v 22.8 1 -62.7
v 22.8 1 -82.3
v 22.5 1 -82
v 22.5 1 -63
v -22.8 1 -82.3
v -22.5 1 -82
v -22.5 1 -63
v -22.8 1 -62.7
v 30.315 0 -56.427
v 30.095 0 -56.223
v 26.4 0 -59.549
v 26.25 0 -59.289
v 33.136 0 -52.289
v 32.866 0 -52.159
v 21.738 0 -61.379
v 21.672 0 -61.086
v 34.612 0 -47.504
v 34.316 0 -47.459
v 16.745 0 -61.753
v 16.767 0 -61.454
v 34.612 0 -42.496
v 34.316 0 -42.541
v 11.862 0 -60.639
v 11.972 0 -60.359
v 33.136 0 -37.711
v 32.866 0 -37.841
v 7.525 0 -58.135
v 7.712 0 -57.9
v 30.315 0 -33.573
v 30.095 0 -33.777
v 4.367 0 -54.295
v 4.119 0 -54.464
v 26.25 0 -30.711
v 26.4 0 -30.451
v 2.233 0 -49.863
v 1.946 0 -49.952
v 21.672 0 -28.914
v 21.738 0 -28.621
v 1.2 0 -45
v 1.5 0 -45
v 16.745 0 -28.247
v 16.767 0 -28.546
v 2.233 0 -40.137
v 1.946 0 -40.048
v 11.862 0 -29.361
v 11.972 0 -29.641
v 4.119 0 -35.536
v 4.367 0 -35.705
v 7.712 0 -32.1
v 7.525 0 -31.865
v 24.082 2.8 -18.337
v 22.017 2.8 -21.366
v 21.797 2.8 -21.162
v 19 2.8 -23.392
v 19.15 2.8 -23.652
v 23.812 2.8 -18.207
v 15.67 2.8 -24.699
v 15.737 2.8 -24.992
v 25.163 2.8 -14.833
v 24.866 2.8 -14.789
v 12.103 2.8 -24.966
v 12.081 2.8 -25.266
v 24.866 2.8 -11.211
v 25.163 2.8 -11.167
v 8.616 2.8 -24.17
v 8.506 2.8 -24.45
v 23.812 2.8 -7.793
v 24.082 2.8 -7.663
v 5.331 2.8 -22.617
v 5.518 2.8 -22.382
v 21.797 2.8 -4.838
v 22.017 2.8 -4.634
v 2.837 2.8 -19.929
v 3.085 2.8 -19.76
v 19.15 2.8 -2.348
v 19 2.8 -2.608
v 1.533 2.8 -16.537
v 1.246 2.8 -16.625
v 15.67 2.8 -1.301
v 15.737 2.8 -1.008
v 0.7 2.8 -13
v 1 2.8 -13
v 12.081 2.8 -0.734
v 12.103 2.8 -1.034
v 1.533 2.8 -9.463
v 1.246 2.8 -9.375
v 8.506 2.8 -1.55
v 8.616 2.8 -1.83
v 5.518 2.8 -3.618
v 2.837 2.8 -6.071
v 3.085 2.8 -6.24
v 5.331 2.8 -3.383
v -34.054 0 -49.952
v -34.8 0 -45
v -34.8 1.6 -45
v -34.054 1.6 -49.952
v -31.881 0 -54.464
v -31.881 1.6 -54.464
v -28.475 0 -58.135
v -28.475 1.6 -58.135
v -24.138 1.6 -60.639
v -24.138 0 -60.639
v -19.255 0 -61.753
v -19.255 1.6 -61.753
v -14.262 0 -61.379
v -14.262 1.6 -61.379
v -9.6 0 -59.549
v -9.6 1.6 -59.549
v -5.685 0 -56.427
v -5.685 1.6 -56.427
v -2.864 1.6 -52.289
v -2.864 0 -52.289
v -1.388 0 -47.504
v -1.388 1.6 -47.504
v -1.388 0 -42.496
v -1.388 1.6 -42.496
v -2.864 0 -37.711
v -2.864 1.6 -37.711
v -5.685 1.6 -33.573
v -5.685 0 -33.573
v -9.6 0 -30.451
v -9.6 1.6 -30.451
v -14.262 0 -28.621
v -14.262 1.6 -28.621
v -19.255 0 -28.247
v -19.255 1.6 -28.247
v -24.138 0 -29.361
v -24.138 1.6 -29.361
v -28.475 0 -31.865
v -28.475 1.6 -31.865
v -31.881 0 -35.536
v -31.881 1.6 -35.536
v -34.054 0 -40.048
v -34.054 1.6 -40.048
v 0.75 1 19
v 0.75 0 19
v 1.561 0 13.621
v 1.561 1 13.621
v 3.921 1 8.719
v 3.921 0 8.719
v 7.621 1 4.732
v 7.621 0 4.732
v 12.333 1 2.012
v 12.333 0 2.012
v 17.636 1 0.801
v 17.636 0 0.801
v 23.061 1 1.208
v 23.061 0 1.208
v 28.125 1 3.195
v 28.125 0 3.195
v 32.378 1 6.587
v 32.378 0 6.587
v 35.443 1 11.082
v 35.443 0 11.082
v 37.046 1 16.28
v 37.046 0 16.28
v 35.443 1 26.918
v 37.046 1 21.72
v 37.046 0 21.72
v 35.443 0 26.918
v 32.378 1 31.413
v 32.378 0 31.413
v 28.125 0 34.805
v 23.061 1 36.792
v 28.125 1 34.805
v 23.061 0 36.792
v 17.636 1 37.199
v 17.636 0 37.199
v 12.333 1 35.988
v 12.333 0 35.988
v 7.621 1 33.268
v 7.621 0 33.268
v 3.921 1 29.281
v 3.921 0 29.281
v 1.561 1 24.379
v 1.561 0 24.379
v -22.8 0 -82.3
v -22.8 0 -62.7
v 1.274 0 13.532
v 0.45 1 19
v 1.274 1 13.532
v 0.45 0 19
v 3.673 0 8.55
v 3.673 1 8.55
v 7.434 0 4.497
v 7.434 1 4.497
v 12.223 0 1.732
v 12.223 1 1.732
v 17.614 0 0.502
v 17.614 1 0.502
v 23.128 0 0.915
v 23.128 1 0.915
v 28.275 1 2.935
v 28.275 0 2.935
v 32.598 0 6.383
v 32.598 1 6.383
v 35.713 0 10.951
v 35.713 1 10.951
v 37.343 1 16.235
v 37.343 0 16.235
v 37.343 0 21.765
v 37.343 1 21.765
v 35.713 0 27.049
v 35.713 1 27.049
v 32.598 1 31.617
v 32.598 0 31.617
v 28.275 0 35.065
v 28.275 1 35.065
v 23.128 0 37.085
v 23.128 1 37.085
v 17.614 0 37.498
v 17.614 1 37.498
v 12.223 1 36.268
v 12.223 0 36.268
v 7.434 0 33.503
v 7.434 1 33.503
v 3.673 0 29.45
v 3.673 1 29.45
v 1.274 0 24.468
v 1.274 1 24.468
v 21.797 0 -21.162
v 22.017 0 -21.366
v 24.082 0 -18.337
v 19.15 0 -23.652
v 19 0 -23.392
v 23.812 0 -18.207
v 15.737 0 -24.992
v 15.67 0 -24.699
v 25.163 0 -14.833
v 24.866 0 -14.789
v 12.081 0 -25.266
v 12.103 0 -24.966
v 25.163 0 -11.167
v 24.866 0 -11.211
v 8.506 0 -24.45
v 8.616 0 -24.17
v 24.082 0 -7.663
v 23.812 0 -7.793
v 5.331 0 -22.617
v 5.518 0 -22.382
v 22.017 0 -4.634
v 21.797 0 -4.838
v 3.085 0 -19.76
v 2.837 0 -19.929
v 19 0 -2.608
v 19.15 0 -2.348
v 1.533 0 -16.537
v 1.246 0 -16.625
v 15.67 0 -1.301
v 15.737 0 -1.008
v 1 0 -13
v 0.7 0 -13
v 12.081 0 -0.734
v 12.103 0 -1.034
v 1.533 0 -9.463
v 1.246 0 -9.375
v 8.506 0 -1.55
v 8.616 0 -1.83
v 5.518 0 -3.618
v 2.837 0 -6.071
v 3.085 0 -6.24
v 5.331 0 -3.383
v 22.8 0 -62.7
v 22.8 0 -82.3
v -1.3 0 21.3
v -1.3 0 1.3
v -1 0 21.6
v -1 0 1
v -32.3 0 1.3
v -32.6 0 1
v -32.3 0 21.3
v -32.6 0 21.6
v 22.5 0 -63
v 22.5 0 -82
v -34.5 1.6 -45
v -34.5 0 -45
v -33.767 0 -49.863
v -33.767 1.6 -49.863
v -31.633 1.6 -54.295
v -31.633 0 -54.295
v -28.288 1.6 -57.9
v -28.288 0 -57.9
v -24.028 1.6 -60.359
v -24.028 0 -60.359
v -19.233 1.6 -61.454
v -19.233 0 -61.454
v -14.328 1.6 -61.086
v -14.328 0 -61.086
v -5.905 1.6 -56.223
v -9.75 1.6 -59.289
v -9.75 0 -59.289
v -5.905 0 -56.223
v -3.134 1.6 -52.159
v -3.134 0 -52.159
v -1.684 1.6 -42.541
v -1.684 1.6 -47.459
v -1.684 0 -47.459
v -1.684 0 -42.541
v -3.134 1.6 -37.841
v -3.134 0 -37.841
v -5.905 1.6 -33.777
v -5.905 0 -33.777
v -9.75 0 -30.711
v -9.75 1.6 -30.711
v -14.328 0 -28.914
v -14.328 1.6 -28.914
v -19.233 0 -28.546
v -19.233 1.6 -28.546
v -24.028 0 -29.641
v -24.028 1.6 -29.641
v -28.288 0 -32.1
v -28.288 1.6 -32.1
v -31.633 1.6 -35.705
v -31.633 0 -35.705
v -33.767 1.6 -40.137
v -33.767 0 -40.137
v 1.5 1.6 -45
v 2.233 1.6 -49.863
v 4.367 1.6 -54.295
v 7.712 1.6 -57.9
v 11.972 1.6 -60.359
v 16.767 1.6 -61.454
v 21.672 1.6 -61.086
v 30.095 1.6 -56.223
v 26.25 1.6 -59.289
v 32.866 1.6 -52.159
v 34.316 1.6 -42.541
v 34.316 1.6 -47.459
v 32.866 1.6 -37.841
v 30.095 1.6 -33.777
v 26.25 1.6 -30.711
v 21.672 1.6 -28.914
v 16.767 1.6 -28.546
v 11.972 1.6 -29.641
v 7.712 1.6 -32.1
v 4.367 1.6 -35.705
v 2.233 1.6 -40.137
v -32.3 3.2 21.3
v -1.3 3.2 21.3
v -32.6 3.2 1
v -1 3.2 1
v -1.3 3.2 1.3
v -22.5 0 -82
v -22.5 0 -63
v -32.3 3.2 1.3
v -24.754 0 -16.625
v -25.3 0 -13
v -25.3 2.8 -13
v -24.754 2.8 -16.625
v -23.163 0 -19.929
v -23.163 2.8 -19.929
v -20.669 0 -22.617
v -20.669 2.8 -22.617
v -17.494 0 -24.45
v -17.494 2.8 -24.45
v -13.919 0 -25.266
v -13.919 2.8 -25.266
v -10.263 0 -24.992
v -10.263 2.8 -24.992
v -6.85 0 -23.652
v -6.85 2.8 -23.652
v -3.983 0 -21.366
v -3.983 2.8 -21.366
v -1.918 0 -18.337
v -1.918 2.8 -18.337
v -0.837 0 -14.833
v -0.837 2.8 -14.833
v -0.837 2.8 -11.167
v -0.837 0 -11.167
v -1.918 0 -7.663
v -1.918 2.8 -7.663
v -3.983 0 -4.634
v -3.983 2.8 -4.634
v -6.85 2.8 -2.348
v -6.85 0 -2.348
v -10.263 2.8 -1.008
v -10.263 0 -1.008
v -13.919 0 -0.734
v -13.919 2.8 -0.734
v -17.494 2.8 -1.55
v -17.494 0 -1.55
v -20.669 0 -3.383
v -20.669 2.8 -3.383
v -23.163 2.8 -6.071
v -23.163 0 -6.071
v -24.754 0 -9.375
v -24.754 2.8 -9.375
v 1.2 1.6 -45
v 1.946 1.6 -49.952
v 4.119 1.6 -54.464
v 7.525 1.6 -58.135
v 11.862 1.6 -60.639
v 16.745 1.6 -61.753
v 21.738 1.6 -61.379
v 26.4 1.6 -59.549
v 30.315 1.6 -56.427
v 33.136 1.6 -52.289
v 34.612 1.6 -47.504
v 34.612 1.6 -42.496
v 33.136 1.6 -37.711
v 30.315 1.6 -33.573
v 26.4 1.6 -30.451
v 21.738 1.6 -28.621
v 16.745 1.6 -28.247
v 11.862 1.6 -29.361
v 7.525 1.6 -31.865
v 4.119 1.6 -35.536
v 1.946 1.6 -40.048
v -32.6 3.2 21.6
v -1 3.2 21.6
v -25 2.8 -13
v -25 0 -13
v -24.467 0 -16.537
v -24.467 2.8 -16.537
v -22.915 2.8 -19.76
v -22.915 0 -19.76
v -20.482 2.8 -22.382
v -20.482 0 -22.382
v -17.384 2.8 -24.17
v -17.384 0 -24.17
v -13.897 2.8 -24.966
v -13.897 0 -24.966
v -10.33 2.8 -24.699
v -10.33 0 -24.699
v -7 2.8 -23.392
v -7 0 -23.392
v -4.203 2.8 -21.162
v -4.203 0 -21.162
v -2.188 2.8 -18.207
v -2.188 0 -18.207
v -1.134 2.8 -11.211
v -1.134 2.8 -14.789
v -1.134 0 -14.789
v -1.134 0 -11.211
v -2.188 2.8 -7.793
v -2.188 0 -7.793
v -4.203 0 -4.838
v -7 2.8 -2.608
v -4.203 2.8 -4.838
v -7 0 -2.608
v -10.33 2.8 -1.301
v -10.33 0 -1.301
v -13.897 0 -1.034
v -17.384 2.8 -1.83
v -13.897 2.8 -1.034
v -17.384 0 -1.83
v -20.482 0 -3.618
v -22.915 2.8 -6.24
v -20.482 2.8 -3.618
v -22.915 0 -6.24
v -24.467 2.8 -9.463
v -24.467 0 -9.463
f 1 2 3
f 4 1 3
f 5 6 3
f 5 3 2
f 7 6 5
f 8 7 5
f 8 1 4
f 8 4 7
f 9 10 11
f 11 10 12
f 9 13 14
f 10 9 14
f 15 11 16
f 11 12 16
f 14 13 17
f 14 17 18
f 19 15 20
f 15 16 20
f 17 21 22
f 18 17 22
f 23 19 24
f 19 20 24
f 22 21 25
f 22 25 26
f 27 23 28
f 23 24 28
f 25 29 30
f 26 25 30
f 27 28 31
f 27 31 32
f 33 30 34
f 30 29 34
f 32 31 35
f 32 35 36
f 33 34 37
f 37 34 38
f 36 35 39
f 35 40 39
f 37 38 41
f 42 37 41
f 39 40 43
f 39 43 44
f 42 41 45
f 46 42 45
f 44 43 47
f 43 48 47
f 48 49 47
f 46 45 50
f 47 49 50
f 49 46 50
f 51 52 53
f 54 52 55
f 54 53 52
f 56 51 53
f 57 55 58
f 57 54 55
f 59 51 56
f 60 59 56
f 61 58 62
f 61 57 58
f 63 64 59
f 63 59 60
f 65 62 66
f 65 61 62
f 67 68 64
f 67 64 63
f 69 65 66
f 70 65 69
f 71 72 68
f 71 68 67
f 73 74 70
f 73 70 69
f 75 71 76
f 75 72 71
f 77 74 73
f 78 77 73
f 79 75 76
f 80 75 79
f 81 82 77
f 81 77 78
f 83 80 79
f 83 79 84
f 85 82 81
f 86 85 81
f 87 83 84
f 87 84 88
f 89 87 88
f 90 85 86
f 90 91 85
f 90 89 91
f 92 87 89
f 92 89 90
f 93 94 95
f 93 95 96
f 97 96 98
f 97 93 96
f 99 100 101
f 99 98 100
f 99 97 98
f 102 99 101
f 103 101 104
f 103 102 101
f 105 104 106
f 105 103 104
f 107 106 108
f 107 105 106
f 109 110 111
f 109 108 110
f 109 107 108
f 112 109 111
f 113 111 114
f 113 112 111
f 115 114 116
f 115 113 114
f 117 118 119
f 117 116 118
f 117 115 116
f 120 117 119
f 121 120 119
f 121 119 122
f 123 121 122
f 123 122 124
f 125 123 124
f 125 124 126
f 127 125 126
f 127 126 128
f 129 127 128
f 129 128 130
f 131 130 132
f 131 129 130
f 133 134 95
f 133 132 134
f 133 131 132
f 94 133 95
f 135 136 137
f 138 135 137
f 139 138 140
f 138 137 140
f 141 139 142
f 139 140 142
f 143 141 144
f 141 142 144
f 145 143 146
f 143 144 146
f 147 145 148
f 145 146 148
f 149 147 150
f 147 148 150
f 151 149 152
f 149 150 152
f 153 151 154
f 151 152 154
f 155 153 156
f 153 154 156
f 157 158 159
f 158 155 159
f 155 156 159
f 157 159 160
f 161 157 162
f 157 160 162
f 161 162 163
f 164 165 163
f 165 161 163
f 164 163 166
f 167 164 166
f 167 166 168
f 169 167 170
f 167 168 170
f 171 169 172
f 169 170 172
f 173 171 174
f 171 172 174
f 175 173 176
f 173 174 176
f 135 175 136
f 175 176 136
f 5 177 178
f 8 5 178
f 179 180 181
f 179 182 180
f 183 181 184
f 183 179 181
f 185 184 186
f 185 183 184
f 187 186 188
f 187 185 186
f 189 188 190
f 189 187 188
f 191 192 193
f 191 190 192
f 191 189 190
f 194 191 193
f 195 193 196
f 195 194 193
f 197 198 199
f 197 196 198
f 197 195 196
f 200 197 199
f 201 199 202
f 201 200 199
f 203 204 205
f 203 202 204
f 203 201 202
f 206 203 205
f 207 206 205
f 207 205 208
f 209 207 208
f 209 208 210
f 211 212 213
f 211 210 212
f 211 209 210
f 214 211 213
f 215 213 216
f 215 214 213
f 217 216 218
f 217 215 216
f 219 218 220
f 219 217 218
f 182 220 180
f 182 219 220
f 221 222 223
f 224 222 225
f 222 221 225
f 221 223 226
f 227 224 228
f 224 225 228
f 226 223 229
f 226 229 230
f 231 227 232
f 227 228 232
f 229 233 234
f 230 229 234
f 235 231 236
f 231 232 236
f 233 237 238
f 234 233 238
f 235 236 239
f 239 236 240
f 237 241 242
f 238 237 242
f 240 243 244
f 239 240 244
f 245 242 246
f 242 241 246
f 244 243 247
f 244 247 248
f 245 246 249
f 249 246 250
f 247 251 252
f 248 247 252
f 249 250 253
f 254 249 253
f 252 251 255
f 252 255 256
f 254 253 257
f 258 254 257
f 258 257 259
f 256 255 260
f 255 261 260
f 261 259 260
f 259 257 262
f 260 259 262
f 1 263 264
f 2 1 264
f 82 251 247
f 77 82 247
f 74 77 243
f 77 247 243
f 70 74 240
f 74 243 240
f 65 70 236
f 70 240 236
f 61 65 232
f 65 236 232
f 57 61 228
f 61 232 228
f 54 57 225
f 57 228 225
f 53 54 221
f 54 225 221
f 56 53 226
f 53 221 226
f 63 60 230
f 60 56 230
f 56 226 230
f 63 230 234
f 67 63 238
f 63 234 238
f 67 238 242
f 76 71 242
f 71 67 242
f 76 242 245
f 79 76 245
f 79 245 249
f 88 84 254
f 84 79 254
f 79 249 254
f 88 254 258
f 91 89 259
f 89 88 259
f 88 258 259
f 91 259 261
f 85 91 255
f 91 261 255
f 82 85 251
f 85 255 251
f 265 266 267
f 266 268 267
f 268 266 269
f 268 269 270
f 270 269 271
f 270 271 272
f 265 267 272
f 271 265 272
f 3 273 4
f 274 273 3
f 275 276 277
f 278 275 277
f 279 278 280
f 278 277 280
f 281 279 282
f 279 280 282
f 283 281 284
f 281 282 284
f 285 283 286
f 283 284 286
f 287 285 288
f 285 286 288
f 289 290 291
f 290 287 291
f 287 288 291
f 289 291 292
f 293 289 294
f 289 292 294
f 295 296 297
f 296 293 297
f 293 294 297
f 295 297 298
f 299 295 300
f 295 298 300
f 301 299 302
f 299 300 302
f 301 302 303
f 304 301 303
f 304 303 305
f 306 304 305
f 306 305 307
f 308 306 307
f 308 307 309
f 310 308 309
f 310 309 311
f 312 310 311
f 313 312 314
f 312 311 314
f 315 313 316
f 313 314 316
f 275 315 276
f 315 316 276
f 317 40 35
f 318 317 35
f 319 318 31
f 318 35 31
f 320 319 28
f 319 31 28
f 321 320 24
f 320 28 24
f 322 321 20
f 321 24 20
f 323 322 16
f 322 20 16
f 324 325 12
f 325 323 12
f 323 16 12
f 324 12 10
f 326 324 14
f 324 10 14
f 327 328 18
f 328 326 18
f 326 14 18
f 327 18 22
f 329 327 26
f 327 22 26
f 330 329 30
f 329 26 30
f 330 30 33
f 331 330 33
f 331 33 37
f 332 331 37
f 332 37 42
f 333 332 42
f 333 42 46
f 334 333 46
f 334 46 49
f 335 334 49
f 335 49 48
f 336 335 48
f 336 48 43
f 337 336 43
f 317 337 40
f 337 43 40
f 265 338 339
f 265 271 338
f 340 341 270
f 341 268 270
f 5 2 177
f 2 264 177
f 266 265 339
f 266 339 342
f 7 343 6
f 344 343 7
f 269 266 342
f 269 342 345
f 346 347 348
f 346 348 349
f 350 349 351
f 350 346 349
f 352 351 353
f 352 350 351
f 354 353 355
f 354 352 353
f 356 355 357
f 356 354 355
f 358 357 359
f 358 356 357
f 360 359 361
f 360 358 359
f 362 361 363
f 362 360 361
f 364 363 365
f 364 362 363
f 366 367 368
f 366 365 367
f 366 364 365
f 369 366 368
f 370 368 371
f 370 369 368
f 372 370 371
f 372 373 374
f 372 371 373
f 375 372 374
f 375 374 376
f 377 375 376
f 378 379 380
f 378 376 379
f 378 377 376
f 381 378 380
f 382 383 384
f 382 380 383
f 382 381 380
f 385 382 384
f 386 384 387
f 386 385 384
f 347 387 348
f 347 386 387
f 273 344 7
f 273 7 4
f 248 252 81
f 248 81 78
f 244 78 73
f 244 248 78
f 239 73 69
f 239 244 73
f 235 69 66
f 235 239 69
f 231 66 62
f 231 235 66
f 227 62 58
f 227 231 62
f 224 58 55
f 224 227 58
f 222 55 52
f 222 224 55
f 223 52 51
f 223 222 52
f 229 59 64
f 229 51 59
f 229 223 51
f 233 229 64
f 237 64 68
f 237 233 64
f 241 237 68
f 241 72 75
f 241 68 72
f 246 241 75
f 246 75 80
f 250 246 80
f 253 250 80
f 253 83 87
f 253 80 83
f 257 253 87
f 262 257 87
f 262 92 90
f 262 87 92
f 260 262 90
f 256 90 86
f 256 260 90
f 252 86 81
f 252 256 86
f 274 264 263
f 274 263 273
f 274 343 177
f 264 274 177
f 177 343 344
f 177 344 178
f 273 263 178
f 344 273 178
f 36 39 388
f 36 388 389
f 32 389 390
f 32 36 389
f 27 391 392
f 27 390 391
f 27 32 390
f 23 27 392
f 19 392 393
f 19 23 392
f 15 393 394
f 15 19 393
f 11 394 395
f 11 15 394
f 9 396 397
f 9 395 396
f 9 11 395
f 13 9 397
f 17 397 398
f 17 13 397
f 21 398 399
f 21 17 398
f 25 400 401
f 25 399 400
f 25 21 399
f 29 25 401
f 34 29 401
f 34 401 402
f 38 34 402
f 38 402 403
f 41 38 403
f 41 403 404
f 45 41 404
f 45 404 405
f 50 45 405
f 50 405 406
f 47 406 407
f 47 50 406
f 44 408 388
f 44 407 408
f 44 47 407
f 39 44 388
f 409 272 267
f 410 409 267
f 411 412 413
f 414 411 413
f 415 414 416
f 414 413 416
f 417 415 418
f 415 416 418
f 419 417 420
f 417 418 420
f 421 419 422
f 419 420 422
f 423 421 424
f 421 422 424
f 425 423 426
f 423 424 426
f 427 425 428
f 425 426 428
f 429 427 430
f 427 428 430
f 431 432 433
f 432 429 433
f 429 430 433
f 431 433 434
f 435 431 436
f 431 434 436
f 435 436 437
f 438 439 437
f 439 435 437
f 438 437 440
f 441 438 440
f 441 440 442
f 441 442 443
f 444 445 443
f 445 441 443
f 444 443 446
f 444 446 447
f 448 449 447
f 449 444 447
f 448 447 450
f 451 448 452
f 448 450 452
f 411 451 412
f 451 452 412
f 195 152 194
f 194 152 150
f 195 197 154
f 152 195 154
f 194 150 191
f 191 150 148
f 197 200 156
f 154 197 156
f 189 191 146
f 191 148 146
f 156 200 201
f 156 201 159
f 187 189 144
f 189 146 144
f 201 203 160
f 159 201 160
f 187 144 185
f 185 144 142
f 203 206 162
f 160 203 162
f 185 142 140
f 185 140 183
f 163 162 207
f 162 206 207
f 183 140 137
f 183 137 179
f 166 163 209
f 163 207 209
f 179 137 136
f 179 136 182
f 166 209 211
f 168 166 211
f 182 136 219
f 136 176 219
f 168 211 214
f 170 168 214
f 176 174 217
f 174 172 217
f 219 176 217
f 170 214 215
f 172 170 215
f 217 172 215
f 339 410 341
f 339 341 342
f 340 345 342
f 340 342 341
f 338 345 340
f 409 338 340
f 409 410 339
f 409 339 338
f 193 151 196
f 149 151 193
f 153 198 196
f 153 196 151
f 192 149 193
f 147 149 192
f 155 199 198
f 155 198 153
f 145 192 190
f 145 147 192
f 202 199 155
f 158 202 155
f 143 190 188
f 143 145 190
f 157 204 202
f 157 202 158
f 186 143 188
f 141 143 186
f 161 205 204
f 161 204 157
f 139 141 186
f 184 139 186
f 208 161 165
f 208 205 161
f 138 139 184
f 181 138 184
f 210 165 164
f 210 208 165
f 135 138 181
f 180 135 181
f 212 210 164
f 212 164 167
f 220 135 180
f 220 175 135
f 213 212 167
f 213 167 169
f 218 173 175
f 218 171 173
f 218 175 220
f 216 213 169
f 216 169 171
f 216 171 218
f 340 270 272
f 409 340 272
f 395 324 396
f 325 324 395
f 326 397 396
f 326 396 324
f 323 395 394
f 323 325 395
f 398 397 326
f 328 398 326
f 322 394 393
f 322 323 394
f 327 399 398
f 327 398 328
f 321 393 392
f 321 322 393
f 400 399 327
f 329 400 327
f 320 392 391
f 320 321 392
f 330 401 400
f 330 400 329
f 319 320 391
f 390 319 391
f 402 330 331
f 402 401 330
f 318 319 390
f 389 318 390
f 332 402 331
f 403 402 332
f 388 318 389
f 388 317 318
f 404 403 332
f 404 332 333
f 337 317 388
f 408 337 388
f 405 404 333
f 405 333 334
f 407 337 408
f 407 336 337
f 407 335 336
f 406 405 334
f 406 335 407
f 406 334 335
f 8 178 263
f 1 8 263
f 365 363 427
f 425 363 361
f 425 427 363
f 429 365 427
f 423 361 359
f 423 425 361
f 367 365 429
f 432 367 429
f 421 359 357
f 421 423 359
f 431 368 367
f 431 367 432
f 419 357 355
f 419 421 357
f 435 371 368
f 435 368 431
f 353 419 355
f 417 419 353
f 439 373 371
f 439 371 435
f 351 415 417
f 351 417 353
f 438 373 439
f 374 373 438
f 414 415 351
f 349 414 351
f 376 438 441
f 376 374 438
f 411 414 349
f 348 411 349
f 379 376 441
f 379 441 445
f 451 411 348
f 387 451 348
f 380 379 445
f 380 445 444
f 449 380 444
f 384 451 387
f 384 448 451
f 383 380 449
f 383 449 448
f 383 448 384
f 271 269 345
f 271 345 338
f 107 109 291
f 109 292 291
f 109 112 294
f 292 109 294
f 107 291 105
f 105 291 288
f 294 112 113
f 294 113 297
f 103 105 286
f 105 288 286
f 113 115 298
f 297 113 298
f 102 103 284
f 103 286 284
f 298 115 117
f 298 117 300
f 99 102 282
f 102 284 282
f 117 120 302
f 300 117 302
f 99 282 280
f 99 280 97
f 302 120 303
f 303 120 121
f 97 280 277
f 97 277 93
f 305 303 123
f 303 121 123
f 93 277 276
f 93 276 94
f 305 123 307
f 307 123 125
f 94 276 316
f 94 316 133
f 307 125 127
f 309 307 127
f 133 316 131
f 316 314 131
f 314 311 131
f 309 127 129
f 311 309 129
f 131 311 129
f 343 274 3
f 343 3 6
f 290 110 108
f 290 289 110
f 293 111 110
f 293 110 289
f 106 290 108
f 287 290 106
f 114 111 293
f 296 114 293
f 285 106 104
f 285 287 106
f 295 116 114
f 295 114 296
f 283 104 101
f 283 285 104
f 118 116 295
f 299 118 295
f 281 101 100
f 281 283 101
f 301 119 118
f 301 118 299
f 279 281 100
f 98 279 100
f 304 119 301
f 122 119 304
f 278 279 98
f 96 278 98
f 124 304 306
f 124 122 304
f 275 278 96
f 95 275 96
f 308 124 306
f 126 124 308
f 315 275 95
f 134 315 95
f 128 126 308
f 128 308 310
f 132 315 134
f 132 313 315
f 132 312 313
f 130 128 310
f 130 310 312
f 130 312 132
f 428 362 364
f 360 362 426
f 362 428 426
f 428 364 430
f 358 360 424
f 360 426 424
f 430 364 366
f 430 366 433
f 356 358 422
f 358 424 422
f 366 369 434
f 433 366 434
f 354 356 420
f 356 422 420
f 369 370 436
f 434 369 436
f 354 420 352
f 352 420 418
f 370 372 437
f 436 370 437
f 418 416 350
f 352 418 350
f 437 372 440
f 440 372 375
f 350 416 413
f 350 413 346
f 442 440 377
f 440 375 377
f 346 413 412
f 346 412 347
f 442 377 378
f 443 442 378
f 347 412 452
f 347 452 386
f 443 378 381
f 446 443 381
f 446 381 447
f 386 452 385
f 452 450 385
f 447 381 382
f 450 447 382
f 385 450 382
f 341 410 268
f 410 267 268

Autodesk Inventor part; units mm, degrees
ref_plane "YZ Plane" through (0, 0, 0) normal (1, 0, 0) x (0, 1, 0)
ref_plane "XZ Plane" through (0, 0, 0) normal (0, 1, 0) x (-1, 0, 0)
ref_plane "XY Plane" through (0, 0, 0) normal (0, 0, 1) x (1, 0, 0)
sketch "スケッチ1" plane through (0, 0, 0) normal (0, 1, 0) x (-1, 0, 0)
  line L0 (0, -106.27) -> (0, 61.52) projected
  line L1 (-52.02, 0) -> (49.27, 0) projected
  circle A0 centre (13, -13) radius 12
  circle A1 centre (13, -13) radius 12.3
  circle A2 centre (18, -45) radius 16.5
  circle A3 centre (18, -45) radius 16.8
  circle A4 centre (-13, -13) radius 12
  circle A5 centre (-13, -13) radius 12.3
  circle A6 centre (-18, -45) radius 16.5
  circle A7 centre (-18, -45) radius 16.8
  line L2 (32.6, 21.6) -> (1, 21.6)
  line L3 (1, 21.6) -> (1, 1)
  line L4 (1, 1) -> (32.6, 1)
  line L5 (32.6, 1) -> (32.6, 21.6)
  line L6 (32.3, 21.3) -> (1.3, 21.3)
  line L7 (1.3, 21.3) -> (1.3, 1.3)
  line L8 (1.3, 1.3) -> (32.3, 1.3)
  line L9 (32.3, 1.3) -> (32.3, 21.3)
  circle A8 centre (-19, 19) radius 18.55
  circle A9 centre (-19, 19) radius 18.25
  line L10 (22.8, -62.7) -> (-22.8, -62.7)
  line L11 (-22.8, -62.7) -> (-22.8, -82.3)
  line L12 (-22.8, -82.3) -> (22.8, -82.3)
  line L13 (22.8, -82.3) -> (22.8, -62.7)
  line L14 (22.5, -63) -> (-22.5, -63)
  line L15 (-22.5, -63) -> (-22.5, -82)
  line L16 (-22.5, -82) -> (22.5, -82)
  line L17 (22.5, -82) -> (22.5, -63)
  point P0 (0, 0)
  point P1 (0, -82.3)
  point P2 (0, -82)
  point P3 (0, -63)
  point P4 (0, -62.7)
  dimension "d0" = 24
  dimension "d1" = 0.3
  dimension "d2" = 13
  dimension "d3" = 13
  dimension "d4" = 33
  dimension "d5" = 0.3
  dimension "d6" = 18
  dimension "d7" = 45
  dimension "d12" = 0.3
  dimension "d13" = 1
  dimension "d14" = 1
  dimension "d15" = 20
  dimension "d16" = 31
  dimension "d17" = 0.3
  dimension "d18" = 36.5
  dimension "d19" = 19
  dimension "d20" = 19
  dimension "d25" = 0.3
  dimension "d26" = 19
  dimension "d27" = 63
  dimension "d28" = 45
extrude "押し出し1" add sketch "スケッチ1" along normal blind 2.8 contours A1 | A5
extrude "押し出し2" add sketch "スケッチ1" along normal blind 1.6 contours A3 | A7
extrude "押し出し3" add sketch "スケッチ1" along normal blind 3.2 contours L5 L4 L3 L2
extrude "押し出し4" add sketch "スケッチ1" along normal blind 1 contours A8
extrude "押し出し5" add sketch "スケッチ1" along normal blind 1 contours L12 L11 L10 L0 L14 L15 L16 | L0 L16 L17 L14 L10 L13 L12
properties part number "DoubleSlipHR_printbase"
